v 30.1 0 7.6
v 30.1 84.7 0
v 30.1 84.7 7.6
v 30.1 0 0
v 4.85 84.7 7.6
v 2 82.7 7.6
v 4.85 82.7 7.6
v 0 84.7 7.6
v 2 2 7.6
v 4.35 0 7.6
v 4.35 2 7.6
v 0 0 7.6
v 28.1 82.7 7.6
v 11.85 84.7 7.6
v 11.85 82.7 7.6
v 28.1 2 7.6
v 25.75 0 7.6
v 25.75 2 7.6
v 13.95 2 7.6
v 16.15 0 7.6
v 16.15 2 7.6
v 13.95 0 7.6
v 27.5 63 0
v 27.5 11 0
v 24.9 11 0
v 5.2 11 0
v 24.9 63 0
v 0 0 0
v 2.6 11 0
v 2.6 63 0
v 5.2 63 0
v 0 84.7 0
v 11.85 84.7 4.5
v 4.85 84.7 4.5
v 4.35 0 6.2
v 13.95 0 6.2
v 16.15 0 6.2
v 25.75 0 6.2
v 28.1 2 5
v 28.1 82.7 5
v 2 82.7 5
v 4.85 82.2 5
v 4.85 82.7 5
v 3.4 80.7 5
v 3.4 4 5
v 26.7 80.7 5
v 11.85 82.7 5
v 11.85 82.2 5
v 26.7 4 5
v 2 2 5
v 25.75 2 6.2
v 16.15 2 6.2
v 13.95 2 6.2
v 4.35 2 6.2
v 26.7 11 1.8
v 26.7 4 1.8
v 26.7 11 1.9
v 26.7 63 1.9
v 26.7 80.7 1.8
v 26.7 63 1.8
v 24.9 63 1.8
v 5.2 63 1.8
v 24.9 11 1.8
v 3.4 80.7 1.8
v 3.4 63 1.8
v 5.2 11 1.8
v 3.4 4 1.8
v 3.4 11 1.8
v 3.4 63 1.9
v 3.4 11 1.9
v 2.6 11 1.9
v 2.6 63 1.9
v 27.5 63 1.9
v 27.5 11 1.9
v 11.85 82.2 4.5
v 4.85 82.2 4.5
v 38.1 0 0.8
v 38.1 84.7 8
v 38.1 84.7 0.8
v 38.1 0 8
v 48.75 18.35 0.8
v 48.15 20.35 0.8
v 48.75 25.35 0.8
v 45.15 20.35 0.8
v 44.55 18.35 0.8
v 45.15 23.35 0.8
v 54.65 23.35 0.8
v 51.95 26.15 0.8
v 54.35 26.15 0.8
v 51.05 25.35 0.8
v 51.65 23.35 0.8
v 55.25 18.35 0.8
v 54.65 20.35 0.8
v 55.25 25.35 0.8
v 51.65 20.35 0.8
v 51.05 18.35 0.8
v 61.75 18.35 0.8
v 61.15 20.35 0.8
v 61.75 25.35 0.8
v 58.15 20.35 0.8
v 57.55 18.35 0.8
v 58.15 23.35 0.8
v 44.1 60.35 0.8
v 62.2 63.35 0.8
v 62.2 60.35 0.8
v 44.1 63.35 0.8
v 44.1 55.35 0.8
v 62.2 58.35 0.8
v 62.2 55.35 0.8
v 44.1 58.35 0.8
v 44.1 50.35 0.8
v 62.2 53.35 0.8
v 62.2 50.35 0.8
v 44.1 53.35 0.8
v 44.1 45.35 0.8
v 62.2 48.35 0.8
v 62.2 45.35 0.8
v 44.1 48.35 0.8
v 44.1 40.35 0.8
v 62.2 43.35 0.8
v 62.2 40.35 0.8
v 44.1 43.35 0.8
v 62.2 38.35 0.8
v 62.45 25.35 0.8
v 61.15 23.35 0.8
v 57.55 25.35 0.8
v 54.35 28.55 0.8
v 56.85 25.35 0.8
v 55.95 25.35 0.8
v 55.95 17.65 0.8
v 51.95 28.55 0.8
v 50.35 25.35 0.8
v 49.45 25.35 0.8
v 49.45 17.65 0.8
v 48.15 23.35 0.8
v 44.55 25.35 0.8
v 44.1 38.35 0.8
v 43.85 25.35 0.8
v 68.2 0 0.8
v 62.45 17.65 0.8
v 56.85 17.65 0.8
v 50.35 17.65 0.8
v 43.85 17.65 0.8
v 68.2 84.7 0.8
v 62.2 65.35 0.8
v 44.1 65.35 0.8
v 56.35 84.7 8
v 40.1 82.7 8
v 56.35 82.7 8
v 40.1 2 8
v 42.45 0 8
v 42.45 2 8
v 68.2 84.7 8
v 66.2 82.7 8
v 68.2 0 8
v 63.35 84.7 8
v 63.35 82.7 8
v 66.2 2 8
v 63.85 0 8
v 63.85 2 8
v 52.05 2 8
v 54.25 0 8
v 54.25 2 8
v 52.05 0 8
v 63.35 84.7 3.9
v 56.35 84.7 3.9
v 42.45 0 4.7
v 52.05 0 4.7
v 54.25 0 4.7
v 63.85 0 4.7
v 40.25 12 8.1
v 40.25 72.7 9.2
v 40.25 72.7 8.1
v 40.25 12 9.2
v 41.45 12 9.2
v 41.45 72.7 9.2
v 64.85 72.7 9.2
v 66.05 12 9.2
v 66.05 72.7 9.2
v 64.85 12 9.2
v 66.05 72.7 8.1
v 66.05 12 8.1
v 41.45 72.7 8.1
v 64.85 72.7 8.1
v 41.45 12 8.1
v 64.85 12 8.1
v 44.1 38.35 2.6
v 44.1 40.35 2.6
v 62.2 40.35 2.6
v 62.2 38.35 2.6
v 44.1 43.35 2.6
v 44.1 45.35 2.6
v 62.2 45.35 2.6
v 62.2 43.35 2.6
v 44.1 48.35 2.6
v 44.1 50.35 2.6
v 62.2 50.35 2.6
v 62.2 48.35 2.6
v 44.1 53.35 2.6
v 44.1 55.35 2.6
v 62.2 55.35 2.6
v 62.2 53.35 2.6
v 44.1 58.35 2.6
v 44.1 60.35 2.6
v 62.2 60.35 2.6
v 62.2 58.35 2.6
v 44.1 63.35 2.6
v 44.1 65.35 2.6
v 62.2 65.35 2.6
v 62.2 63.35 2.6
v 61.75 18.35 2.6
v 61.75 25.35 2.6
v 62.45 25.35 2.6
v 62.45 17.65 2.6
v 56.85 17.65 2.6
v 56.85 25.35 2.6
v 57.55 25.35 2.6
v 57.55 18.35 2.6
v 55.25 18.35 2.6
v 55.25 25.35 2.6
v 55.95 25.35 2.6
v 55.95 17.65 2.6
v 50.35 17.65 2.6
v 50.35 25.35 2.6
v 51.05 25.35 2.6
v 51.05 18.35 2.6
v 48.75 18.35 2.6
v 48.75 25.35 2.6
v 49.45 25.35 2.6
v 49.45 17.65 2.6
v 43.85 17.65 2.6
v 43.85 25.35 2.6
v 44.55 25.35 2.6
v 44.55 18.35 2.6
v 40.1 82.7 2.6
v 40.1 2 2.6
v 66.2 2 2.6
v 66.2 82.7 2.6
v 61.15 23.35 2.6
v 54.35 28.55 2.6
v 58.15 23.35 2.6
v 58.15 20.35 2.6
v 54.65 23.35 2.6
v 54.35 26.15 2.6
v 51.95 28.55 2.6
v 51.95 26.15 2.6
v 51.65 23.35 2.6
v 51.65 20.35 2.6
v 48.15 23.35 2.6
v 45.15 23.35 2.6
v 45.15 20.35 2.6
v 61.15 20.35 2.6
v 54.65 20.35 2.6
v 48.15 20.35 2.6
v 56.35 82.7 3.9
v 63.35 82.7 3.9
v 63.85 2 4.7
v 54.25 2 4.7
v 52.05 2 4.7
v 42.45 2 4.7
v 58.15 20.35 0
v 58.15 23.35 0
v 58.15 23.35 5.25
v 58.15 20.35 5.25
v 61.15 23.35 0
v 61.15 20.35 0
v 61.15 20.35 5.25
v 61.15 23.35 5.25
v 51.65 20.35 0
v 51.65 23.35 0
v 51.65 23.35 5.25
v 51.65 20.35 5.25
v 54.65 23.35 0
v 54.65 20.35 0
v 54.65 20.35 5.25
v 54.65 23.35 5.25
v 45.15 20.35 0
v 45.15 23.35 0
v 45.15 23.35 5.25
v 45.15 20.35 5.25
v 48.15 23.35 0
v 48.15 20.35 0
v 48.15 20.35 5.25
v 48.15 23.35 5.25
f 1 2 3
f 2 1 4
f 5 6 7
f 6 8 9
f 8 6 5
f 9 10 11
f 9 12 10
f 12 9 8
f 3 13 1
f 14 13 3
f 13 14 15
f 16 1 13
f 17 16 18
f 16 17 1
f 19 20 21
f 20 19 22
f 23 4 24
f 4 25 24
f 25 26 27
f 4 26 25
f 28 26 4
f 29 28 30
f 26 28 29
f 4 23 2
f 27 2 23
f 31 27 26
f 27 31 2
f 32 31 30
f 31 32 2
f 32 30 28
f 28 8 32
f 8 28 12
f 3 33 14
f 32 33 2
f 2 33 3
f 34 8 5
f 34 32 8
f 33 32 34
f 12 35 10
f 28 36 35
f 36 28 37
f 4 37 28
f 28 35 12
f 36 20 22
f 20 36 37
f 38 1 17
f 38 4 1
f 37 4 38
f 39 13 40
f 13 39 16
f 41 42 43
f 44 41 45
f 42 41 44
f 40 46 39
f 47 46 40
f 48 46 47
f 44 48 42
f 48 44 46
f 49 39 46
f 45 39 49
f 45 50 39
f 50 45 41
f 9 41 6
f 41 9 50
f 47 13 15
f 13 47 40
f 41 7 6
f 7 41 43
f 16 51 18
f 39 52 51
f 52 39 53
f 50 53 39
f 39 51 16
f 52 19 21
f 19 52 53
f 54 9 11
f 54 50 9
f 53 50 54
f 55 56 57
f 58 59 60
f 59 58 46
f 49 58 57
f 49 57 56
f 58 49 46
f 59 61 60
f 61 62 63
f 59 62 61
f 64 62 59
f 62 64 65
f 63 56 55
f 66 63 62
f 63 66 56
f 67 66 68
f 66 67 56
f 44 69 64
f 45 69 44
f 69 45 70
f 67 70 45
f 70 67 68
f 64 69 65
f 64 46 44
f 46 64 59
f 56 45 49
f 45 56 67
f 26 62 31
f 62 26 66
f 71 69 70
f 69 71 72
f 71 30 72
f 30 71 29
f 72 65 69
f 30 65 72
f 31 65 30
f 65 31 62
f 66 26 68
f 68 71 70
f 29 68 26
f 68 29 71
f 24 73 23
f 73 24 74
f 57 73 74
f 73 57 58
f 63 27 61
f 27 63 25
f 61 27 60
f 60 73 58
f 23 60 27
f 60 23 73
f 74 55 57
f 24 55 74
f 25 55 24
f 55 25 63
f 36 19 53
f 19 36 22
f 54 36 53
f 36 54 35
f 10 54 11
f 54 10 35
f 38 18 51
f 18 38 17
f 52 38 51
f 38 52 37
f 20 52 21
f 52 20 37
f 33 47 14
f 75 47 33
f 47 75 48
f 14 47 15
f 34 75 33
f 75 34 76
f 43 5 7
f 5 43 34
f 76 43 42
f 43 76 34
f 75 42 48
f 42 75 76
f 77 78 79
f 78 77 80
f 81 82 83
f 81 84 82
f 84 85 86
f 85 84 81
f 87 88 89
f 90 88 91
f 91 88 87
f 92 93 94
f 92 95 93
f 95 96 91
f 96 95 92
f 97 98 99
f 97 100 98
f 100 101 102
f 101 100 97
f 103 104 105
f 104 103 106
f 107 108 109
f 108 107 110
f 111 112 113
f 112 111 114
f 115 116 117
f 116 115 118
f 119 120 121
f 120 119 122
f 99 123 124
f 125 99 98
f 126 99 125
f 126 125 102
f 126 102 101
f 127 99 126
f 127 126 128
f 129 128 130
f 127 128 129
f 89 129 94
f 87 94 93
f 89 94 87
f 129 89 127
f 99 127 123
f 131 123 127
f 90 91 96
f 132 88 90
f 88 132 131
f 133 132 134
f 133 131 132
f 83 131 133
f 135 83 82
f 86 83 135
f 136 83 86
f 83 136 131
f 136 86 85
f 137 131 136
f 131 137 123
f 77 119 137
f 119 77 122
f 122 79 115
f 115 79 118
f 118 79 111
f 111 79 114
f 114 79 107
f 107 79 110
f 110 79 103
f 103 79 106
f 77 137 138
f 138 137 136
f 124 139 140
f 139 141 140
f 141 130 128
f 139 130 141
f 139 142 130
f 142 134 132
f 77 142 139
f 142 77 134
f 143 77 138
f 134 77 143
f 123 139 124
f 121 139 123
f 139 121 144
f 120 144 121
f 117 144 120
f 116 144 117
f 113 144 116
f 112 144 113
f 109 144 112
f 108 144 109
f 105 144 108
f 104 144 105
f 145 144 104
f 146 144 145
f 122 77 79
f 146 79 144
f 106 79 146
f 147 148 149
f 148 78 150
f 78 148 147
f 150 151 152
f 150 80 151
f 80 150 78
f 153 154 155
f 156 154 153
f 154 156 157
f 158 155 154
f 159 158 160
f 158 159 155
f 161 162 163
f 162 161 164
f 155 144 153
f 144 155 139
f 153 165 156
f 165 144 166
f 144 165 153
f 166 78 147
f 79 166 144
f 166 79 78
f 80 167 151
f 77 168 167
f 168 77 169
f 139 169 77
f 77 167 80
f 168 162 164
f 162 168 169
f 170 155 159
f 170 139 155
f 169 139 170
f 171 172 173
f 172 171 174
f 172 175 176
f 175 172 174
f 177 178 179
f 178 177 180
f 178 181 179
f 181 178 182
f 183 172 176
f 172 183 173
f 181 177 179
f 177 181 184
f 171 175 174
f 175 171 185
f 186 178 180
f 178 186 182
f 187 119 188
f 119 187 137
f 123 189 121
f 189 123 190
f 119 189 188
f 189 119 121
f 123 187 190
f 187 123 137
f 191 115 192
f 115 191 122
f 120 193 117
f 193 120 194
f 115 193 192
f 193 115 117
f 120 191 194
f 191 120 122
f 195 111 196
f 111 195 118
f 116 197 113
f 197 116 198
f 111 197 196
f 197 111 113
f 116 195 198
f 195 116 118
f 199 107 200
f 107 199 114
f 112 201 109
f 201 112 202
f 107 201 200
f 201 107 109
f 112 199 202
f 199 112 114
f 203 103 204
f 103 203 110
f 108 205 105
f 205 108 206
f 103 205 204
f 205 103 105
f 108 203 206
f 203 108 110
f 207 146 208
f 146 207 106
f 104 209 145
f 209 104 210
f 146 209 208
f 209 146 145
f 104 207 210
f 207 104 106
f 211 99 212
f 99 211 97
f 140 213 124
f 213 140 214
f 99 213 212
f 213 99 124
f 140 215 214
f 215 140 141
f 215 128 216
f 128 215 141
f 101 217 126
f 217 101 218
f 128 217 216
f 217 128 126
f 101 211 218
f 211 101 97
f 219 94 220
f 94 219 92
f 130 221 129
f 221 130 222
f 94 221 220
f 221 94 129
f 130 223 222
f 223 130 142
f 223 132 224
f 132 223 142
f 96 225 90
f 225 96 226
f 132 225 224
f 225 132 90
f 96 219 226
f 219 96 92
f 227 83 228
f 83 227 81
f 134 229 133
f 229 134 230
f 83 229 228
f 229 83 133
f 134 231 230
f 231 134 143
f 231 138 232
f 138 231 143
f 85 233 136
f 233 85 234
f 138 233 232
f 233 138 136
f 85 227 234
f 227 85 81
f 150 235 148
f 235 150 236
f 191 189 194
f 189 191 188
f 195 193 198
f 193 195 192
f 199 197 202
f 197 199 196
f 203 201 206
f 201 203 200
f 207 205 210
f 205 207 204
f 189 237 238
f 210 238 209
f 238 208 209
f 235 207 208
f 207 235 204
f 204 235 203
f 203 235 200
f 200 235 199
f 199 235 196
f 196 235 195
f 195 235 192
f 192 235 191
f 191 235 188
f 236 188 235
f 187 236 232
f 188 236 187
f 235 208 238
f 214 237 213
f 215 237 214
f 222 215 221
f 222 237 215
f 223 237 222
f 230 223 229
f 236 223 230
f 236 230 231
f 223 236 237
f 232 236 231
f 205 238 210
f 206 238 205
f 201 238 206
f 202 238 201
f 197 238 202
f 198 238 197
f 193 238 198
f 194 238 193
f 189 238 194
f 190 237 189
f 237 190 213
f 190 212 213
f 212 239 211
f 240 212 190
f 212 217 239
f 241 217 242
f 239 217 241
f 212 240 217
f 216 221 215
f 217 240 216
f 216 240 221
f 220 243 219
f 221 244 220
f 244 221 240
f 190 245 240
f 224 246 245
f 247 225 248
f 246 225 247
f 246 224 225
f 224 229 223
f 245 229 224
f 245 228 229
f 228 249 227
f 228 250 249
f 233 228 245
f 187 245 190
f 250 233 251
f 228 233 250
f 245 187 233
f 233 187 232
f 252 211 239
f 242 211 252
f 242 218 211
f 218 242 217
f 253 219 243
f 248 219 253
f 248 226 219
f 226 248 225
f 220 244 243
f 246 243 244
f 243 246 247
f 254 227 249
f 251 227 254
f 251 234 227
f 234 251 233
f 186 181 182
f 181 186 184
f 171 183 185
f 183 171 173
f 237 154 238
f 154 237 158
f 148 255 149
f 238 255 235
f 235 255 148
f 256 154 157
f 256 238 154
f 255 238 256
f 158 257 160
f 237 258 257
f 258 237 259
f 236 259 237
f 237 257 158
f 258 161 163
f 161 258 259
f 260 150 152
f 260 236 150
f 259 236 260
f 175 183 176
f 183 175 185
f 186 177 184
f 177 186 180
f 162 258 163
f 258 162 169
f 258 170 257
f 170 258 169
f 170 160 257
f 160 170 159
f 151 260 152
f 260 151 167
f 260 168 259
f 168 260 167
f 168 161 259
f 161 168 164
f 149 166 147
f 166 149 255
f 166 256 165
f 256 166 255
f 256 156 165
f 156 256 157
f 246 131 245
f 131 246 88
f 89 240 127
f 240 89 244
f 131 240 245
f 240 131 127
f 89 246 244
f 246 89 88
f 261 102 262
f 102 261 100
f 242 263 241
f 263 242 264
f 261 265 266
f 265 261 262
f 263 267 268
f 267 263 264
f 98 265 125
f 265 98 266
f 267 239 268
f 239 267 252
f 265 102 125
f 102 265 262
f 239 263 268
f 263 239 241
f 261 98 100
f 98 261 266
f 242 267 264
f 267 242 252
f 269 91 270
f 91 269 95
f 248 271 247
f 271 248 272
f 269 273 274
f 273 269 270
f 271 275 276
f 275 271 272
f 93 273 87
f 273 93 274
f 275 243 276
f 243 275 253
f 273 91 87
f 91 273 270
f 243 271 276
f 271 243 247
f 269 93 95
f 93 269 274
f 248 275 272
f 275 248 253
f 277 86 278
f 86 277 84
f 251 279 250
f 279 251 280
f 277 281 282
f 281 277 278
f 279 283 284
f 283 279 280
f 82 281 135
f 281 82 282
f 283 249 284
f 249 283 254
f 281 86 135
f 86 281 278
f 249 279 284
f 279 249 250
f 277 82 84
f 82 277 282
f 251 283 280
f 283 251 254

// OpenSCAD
/**
 * Lierda AM36-Pico (L-LRMAM36-FANN4-PK02) Snap-Fit Enclosure with Tactile Button Actuators
 * Exact dimensions from L-LRMAM36-FANN4-PK02_layout_V01.pdf & Hardware Design Manual Rev 1.0:
 *   - PCB Size: 80.00 mm (Y) x 25.40 mm (X) x 1.60 mm (Z)
 *   - Top-Left (Y=80.0, X=6.0): ANT1 Edge-Mount SMA Jack (Sub-GHz + 2.4 GHz LR2021 RF)
 *   - Top-Right (Y=80.0, X=19.4): ANT2 2.4 GHz Wi-Fi/BLE Onboard Antenna (enclosed under RF-transparent ABS/PETG roof)
 *   - Bottom-Left (Y=0.0, X=6.8): CON2 USB Type-C (ESP32-S3 Native USB-Serial-JTAG)
 *   - Bottom-Right (Y=0.0, X=18.6): CON1 USB Type-C (CP2105 Dual UART)
 *   - Tactile Buttons (Y=19.5 from bottom USB edge):
 *       * K1 (RST):  X = 6.2 mm
 *       * K2 (BOOT): X = 12.7 mm
 *       * K3 (KEY):  X = 19.2 mm
 *   - RGB Status LED (D7 WS2812): X = 12.7 mm, Y = 25.0 mm
 *
 * Render options:
 *   part = "both"   -> Side-by-side print plate (bottom tray + top lid with buttons)
 *   part = "bottom" -> Bottom cradle shell only
 *   part = "top"    -> Top button shell only
 */

$fn = 48;
part = "both";

pcb_w = 25.40;
pcb_l = 80.00;
pcb_t = 1.60;
tol   = 0.35;     // XY clearance around PCB
wall  = 2.00;     // Outer wall thickness

inner_w = pcb_w + 2 * tol; // 26.10 mm
inner_l = pcb_l + 2 * tol; // 80.70 mm
outer_w = inner_w + 2 * wall; // 30.10 mm
outer_l = inner_l + 2 * wall; // 84.70 mm

bot_floor = 1.80;
pcb_ledge_h = 3.20; // Clearance under PCB for solder joints / components
bot_h = bot_floor + pcb_ledge_h + pcb_t + 1.0; // 7.60 mm total bottom tray height

top_roof = 1.80;
top_comp_h = 5.40; // Clearance above PCB top surface (L-LRMAM36-FANN4 shield is 3.15mm tall)
top_h = top_roof + top_comp_h; // 7.20 mm total top lid height

// Button coordinates relative to PCB origin (bottom-left corner)
btn_y = 19.50;
btn_x_rst  = 6.20;
btn_x_boot = 12.70;
btn_x_key  = 19.20;
btn_top_z_above_pcb = 2.50; // Standard SMD tactile switch height

// LED D7 coordinate relative to PCB origin
led_x = 12.70;
led_y = 25.00;

module bottom_shell() {
    difference() {
        // Outer shell
        cube([outer_w, outer_l, bot_h]);

        // Main interior cavity above PCB support ledge
        translate([wall, wall, bot_floor + pcb_ledge_h])
            cube([inner_w, inner_l, bot_h]);

        // Under-PCB cavity (leaving 1.4mm perimeter ledge and 4 corner support rails)
        translate([wall + 1.4, wall + 2.0, bot_floor])
            cube([inner_w - 2.8, inner_l - 4.0, pcb_ledge_h + 0.1]);

        // Optional underside pin header slots for J3 (left) and J4 (right) 2.54mm rows
        translate([wall + 0.6, wall + 9.0, -0.1])
            cube([2.6, 52.0, bot_floor + 0.2]);
        translate([outer_w - wall - 3.2, wall + 9.0, -0.1])
            cube([2.6, 52.0, bot_floor + 0.2]);

        // Bottom-Left USB-C cutout (CON2: Native USB)
        translate([wall + tol + 6.8 - 4.8, -0.5, bot_floor + pcb_ledge_h + pcb_t - 0.4])
            cube([9.6, wall + 1.5, 4.5]);

        // Bottom-Right USB-C cutout (CON1: UART)
        translate([wall + tol + 18.6 - 4.8, -0.5, bot_floor + pcb_ledge_h + pcb_t - 0.4])
            cube([9.6, wall + 1.5, 4.5]);

        // Top-Left SMA bulk-head U-slot (ANT1)
        translate([wall + tol + 6.0 - 3.5, outer_l - wall - 0.5, bot_floor + pcb_ledge_h - 0.5])
            cube([7.0, wall + 1.0, 6.0]);
    }
}

module cantilever_button(cx, cy) {
    // Cut U-shaped flex slot around a 4.2mm x 7.0mm cantilever finger hinged at +Y
    btn_w = 4.2;
    btn_l = 7.0;
    slot  = 0.7;
    translate([cx - btn_w/2 - slot, cy - btn_l/2 - slot, -0.1]) {
        // Left slot
        cube([slot, btn_l + slot, top_roof + 0.2]);
        // Right slot
        translate([btn_w + slot, 0, 0])
            cube([slot, btn_l + slot, top_roof + 0.2]);
        // Front slot (-Y end)
        cube([btn_w + 2*slot, slot, top_roof + 0.2]);
    }
}

module button_plunger(cx, cy) {
    // Raised external cap + internal actuator post reaching down to SMD tactile switch
    plunger_h = top_comp_h - btn_top_z_above_pcb - 0.25;
    translate([cx - 1.5, cy - 1.5, -plunger_h])
        cube([3.0, 3.0, plunger_h + top_roof + 0.8]);
}

module top_shell() {
    bx1 = wall + tol + btn_x_rst;
    bx2 = wall + tol + btn_x_boot;
    bx3 = wall + tol + btn_x_key;
    by  = wall + tol + btn_y;

    union() {
        difference() {
            union() {
                // Outer upper shell
                cube([outer_w, outer_l, top_h]);
                // Inner snap-fit lip that nests 1.2mm into bottom_shell
                translate([wall + 0.15, wall + 10.0, -1.2])
                    cube([inner_w - 0.3, inner_l - 20.0, 1.2]);
            }

            // Main interior cavity
            translate([wall, wall, -0.1])
                cube([inner_w, inner_l, top_comp_h + 0.1]);

            // Inner relief inside snap-fit lip
            translate([wall + 1.35, wall + 10.0, -1.3])
                cube([inner_w - 2.7, inner_l - 20.0, 1.4]);

            // Bottom-Left USB-C upper arch (CON2)
            translate([wall + tol + 6.8 - 4.8, -0.5, -0.1])
                cube([9.6, wall + 1.5, 3.4]);

            // Bottom-Right USB-C upper arch (CON1)
            translate([wall + tol + 18.6 - 4.8, -0.5, -0.1])
                cube([9.6, wall + 1.5, 3.4]);

            // Top-Left SMA connector upper arch (ANT1)
            translate([wall + tol + 6.0 - 3.5, outer_l - wall - 0.5, -0.1])
                cube([7.0, wall + 1.0, 4.2]);

            // D7 RGB Status LED light-pipe window
            translate([wall + tol + led_x - 1.2, wall + tol + led_y - 1.2, top_comp_h - 0.2])
                cube([2.4, 2.4, top_roof + 0.5]);

            // Cooling vents over L-LRMAM36-FANN4 RF shield (Y = 34..64 mm)
            for (vy = [36 : 5 : 61]) {
                translate([wall + 4.0, wall + tol + vy, top_comp_h - 0.2])
                    cube([inner_w - 8.0, 2.0, top_roof + 0.5]);
            }

            // 3 Cantilever U-slots for K1 (RST), K2 (BOOT), K3 (KEY)
            translate([0, 0, top_comp_h]) {
                cantilever_button(bx1, by);
                cantilever_button(bx2, by);
                cantilever_button(bx3, by);
            }
        }

        // Add internal tactile plungers + 0.8mm raised finger caps on K1, K2, K3
        translate([0, 0, top_comp_h]) {
            button_plunger(bx1, by);
            button_plunger(bx2, by);
            button_plunger(bx3, by);
        }
    }
}

if (part == "bottom") {
    bottom_shell();
} else if (part == "top") {
    // Flip upside down for support-free 3D printing
    translate([outer_w, 0, top_h + 0.8])
        rotate([0, 180, 0])
            top_shell();
} else {
    bottom_shell();
    translate([outer_w + 8.0 + outer_w, 0, top_h + 0.8])
        rotate([0, 180, 0])
            top_shell();
}
